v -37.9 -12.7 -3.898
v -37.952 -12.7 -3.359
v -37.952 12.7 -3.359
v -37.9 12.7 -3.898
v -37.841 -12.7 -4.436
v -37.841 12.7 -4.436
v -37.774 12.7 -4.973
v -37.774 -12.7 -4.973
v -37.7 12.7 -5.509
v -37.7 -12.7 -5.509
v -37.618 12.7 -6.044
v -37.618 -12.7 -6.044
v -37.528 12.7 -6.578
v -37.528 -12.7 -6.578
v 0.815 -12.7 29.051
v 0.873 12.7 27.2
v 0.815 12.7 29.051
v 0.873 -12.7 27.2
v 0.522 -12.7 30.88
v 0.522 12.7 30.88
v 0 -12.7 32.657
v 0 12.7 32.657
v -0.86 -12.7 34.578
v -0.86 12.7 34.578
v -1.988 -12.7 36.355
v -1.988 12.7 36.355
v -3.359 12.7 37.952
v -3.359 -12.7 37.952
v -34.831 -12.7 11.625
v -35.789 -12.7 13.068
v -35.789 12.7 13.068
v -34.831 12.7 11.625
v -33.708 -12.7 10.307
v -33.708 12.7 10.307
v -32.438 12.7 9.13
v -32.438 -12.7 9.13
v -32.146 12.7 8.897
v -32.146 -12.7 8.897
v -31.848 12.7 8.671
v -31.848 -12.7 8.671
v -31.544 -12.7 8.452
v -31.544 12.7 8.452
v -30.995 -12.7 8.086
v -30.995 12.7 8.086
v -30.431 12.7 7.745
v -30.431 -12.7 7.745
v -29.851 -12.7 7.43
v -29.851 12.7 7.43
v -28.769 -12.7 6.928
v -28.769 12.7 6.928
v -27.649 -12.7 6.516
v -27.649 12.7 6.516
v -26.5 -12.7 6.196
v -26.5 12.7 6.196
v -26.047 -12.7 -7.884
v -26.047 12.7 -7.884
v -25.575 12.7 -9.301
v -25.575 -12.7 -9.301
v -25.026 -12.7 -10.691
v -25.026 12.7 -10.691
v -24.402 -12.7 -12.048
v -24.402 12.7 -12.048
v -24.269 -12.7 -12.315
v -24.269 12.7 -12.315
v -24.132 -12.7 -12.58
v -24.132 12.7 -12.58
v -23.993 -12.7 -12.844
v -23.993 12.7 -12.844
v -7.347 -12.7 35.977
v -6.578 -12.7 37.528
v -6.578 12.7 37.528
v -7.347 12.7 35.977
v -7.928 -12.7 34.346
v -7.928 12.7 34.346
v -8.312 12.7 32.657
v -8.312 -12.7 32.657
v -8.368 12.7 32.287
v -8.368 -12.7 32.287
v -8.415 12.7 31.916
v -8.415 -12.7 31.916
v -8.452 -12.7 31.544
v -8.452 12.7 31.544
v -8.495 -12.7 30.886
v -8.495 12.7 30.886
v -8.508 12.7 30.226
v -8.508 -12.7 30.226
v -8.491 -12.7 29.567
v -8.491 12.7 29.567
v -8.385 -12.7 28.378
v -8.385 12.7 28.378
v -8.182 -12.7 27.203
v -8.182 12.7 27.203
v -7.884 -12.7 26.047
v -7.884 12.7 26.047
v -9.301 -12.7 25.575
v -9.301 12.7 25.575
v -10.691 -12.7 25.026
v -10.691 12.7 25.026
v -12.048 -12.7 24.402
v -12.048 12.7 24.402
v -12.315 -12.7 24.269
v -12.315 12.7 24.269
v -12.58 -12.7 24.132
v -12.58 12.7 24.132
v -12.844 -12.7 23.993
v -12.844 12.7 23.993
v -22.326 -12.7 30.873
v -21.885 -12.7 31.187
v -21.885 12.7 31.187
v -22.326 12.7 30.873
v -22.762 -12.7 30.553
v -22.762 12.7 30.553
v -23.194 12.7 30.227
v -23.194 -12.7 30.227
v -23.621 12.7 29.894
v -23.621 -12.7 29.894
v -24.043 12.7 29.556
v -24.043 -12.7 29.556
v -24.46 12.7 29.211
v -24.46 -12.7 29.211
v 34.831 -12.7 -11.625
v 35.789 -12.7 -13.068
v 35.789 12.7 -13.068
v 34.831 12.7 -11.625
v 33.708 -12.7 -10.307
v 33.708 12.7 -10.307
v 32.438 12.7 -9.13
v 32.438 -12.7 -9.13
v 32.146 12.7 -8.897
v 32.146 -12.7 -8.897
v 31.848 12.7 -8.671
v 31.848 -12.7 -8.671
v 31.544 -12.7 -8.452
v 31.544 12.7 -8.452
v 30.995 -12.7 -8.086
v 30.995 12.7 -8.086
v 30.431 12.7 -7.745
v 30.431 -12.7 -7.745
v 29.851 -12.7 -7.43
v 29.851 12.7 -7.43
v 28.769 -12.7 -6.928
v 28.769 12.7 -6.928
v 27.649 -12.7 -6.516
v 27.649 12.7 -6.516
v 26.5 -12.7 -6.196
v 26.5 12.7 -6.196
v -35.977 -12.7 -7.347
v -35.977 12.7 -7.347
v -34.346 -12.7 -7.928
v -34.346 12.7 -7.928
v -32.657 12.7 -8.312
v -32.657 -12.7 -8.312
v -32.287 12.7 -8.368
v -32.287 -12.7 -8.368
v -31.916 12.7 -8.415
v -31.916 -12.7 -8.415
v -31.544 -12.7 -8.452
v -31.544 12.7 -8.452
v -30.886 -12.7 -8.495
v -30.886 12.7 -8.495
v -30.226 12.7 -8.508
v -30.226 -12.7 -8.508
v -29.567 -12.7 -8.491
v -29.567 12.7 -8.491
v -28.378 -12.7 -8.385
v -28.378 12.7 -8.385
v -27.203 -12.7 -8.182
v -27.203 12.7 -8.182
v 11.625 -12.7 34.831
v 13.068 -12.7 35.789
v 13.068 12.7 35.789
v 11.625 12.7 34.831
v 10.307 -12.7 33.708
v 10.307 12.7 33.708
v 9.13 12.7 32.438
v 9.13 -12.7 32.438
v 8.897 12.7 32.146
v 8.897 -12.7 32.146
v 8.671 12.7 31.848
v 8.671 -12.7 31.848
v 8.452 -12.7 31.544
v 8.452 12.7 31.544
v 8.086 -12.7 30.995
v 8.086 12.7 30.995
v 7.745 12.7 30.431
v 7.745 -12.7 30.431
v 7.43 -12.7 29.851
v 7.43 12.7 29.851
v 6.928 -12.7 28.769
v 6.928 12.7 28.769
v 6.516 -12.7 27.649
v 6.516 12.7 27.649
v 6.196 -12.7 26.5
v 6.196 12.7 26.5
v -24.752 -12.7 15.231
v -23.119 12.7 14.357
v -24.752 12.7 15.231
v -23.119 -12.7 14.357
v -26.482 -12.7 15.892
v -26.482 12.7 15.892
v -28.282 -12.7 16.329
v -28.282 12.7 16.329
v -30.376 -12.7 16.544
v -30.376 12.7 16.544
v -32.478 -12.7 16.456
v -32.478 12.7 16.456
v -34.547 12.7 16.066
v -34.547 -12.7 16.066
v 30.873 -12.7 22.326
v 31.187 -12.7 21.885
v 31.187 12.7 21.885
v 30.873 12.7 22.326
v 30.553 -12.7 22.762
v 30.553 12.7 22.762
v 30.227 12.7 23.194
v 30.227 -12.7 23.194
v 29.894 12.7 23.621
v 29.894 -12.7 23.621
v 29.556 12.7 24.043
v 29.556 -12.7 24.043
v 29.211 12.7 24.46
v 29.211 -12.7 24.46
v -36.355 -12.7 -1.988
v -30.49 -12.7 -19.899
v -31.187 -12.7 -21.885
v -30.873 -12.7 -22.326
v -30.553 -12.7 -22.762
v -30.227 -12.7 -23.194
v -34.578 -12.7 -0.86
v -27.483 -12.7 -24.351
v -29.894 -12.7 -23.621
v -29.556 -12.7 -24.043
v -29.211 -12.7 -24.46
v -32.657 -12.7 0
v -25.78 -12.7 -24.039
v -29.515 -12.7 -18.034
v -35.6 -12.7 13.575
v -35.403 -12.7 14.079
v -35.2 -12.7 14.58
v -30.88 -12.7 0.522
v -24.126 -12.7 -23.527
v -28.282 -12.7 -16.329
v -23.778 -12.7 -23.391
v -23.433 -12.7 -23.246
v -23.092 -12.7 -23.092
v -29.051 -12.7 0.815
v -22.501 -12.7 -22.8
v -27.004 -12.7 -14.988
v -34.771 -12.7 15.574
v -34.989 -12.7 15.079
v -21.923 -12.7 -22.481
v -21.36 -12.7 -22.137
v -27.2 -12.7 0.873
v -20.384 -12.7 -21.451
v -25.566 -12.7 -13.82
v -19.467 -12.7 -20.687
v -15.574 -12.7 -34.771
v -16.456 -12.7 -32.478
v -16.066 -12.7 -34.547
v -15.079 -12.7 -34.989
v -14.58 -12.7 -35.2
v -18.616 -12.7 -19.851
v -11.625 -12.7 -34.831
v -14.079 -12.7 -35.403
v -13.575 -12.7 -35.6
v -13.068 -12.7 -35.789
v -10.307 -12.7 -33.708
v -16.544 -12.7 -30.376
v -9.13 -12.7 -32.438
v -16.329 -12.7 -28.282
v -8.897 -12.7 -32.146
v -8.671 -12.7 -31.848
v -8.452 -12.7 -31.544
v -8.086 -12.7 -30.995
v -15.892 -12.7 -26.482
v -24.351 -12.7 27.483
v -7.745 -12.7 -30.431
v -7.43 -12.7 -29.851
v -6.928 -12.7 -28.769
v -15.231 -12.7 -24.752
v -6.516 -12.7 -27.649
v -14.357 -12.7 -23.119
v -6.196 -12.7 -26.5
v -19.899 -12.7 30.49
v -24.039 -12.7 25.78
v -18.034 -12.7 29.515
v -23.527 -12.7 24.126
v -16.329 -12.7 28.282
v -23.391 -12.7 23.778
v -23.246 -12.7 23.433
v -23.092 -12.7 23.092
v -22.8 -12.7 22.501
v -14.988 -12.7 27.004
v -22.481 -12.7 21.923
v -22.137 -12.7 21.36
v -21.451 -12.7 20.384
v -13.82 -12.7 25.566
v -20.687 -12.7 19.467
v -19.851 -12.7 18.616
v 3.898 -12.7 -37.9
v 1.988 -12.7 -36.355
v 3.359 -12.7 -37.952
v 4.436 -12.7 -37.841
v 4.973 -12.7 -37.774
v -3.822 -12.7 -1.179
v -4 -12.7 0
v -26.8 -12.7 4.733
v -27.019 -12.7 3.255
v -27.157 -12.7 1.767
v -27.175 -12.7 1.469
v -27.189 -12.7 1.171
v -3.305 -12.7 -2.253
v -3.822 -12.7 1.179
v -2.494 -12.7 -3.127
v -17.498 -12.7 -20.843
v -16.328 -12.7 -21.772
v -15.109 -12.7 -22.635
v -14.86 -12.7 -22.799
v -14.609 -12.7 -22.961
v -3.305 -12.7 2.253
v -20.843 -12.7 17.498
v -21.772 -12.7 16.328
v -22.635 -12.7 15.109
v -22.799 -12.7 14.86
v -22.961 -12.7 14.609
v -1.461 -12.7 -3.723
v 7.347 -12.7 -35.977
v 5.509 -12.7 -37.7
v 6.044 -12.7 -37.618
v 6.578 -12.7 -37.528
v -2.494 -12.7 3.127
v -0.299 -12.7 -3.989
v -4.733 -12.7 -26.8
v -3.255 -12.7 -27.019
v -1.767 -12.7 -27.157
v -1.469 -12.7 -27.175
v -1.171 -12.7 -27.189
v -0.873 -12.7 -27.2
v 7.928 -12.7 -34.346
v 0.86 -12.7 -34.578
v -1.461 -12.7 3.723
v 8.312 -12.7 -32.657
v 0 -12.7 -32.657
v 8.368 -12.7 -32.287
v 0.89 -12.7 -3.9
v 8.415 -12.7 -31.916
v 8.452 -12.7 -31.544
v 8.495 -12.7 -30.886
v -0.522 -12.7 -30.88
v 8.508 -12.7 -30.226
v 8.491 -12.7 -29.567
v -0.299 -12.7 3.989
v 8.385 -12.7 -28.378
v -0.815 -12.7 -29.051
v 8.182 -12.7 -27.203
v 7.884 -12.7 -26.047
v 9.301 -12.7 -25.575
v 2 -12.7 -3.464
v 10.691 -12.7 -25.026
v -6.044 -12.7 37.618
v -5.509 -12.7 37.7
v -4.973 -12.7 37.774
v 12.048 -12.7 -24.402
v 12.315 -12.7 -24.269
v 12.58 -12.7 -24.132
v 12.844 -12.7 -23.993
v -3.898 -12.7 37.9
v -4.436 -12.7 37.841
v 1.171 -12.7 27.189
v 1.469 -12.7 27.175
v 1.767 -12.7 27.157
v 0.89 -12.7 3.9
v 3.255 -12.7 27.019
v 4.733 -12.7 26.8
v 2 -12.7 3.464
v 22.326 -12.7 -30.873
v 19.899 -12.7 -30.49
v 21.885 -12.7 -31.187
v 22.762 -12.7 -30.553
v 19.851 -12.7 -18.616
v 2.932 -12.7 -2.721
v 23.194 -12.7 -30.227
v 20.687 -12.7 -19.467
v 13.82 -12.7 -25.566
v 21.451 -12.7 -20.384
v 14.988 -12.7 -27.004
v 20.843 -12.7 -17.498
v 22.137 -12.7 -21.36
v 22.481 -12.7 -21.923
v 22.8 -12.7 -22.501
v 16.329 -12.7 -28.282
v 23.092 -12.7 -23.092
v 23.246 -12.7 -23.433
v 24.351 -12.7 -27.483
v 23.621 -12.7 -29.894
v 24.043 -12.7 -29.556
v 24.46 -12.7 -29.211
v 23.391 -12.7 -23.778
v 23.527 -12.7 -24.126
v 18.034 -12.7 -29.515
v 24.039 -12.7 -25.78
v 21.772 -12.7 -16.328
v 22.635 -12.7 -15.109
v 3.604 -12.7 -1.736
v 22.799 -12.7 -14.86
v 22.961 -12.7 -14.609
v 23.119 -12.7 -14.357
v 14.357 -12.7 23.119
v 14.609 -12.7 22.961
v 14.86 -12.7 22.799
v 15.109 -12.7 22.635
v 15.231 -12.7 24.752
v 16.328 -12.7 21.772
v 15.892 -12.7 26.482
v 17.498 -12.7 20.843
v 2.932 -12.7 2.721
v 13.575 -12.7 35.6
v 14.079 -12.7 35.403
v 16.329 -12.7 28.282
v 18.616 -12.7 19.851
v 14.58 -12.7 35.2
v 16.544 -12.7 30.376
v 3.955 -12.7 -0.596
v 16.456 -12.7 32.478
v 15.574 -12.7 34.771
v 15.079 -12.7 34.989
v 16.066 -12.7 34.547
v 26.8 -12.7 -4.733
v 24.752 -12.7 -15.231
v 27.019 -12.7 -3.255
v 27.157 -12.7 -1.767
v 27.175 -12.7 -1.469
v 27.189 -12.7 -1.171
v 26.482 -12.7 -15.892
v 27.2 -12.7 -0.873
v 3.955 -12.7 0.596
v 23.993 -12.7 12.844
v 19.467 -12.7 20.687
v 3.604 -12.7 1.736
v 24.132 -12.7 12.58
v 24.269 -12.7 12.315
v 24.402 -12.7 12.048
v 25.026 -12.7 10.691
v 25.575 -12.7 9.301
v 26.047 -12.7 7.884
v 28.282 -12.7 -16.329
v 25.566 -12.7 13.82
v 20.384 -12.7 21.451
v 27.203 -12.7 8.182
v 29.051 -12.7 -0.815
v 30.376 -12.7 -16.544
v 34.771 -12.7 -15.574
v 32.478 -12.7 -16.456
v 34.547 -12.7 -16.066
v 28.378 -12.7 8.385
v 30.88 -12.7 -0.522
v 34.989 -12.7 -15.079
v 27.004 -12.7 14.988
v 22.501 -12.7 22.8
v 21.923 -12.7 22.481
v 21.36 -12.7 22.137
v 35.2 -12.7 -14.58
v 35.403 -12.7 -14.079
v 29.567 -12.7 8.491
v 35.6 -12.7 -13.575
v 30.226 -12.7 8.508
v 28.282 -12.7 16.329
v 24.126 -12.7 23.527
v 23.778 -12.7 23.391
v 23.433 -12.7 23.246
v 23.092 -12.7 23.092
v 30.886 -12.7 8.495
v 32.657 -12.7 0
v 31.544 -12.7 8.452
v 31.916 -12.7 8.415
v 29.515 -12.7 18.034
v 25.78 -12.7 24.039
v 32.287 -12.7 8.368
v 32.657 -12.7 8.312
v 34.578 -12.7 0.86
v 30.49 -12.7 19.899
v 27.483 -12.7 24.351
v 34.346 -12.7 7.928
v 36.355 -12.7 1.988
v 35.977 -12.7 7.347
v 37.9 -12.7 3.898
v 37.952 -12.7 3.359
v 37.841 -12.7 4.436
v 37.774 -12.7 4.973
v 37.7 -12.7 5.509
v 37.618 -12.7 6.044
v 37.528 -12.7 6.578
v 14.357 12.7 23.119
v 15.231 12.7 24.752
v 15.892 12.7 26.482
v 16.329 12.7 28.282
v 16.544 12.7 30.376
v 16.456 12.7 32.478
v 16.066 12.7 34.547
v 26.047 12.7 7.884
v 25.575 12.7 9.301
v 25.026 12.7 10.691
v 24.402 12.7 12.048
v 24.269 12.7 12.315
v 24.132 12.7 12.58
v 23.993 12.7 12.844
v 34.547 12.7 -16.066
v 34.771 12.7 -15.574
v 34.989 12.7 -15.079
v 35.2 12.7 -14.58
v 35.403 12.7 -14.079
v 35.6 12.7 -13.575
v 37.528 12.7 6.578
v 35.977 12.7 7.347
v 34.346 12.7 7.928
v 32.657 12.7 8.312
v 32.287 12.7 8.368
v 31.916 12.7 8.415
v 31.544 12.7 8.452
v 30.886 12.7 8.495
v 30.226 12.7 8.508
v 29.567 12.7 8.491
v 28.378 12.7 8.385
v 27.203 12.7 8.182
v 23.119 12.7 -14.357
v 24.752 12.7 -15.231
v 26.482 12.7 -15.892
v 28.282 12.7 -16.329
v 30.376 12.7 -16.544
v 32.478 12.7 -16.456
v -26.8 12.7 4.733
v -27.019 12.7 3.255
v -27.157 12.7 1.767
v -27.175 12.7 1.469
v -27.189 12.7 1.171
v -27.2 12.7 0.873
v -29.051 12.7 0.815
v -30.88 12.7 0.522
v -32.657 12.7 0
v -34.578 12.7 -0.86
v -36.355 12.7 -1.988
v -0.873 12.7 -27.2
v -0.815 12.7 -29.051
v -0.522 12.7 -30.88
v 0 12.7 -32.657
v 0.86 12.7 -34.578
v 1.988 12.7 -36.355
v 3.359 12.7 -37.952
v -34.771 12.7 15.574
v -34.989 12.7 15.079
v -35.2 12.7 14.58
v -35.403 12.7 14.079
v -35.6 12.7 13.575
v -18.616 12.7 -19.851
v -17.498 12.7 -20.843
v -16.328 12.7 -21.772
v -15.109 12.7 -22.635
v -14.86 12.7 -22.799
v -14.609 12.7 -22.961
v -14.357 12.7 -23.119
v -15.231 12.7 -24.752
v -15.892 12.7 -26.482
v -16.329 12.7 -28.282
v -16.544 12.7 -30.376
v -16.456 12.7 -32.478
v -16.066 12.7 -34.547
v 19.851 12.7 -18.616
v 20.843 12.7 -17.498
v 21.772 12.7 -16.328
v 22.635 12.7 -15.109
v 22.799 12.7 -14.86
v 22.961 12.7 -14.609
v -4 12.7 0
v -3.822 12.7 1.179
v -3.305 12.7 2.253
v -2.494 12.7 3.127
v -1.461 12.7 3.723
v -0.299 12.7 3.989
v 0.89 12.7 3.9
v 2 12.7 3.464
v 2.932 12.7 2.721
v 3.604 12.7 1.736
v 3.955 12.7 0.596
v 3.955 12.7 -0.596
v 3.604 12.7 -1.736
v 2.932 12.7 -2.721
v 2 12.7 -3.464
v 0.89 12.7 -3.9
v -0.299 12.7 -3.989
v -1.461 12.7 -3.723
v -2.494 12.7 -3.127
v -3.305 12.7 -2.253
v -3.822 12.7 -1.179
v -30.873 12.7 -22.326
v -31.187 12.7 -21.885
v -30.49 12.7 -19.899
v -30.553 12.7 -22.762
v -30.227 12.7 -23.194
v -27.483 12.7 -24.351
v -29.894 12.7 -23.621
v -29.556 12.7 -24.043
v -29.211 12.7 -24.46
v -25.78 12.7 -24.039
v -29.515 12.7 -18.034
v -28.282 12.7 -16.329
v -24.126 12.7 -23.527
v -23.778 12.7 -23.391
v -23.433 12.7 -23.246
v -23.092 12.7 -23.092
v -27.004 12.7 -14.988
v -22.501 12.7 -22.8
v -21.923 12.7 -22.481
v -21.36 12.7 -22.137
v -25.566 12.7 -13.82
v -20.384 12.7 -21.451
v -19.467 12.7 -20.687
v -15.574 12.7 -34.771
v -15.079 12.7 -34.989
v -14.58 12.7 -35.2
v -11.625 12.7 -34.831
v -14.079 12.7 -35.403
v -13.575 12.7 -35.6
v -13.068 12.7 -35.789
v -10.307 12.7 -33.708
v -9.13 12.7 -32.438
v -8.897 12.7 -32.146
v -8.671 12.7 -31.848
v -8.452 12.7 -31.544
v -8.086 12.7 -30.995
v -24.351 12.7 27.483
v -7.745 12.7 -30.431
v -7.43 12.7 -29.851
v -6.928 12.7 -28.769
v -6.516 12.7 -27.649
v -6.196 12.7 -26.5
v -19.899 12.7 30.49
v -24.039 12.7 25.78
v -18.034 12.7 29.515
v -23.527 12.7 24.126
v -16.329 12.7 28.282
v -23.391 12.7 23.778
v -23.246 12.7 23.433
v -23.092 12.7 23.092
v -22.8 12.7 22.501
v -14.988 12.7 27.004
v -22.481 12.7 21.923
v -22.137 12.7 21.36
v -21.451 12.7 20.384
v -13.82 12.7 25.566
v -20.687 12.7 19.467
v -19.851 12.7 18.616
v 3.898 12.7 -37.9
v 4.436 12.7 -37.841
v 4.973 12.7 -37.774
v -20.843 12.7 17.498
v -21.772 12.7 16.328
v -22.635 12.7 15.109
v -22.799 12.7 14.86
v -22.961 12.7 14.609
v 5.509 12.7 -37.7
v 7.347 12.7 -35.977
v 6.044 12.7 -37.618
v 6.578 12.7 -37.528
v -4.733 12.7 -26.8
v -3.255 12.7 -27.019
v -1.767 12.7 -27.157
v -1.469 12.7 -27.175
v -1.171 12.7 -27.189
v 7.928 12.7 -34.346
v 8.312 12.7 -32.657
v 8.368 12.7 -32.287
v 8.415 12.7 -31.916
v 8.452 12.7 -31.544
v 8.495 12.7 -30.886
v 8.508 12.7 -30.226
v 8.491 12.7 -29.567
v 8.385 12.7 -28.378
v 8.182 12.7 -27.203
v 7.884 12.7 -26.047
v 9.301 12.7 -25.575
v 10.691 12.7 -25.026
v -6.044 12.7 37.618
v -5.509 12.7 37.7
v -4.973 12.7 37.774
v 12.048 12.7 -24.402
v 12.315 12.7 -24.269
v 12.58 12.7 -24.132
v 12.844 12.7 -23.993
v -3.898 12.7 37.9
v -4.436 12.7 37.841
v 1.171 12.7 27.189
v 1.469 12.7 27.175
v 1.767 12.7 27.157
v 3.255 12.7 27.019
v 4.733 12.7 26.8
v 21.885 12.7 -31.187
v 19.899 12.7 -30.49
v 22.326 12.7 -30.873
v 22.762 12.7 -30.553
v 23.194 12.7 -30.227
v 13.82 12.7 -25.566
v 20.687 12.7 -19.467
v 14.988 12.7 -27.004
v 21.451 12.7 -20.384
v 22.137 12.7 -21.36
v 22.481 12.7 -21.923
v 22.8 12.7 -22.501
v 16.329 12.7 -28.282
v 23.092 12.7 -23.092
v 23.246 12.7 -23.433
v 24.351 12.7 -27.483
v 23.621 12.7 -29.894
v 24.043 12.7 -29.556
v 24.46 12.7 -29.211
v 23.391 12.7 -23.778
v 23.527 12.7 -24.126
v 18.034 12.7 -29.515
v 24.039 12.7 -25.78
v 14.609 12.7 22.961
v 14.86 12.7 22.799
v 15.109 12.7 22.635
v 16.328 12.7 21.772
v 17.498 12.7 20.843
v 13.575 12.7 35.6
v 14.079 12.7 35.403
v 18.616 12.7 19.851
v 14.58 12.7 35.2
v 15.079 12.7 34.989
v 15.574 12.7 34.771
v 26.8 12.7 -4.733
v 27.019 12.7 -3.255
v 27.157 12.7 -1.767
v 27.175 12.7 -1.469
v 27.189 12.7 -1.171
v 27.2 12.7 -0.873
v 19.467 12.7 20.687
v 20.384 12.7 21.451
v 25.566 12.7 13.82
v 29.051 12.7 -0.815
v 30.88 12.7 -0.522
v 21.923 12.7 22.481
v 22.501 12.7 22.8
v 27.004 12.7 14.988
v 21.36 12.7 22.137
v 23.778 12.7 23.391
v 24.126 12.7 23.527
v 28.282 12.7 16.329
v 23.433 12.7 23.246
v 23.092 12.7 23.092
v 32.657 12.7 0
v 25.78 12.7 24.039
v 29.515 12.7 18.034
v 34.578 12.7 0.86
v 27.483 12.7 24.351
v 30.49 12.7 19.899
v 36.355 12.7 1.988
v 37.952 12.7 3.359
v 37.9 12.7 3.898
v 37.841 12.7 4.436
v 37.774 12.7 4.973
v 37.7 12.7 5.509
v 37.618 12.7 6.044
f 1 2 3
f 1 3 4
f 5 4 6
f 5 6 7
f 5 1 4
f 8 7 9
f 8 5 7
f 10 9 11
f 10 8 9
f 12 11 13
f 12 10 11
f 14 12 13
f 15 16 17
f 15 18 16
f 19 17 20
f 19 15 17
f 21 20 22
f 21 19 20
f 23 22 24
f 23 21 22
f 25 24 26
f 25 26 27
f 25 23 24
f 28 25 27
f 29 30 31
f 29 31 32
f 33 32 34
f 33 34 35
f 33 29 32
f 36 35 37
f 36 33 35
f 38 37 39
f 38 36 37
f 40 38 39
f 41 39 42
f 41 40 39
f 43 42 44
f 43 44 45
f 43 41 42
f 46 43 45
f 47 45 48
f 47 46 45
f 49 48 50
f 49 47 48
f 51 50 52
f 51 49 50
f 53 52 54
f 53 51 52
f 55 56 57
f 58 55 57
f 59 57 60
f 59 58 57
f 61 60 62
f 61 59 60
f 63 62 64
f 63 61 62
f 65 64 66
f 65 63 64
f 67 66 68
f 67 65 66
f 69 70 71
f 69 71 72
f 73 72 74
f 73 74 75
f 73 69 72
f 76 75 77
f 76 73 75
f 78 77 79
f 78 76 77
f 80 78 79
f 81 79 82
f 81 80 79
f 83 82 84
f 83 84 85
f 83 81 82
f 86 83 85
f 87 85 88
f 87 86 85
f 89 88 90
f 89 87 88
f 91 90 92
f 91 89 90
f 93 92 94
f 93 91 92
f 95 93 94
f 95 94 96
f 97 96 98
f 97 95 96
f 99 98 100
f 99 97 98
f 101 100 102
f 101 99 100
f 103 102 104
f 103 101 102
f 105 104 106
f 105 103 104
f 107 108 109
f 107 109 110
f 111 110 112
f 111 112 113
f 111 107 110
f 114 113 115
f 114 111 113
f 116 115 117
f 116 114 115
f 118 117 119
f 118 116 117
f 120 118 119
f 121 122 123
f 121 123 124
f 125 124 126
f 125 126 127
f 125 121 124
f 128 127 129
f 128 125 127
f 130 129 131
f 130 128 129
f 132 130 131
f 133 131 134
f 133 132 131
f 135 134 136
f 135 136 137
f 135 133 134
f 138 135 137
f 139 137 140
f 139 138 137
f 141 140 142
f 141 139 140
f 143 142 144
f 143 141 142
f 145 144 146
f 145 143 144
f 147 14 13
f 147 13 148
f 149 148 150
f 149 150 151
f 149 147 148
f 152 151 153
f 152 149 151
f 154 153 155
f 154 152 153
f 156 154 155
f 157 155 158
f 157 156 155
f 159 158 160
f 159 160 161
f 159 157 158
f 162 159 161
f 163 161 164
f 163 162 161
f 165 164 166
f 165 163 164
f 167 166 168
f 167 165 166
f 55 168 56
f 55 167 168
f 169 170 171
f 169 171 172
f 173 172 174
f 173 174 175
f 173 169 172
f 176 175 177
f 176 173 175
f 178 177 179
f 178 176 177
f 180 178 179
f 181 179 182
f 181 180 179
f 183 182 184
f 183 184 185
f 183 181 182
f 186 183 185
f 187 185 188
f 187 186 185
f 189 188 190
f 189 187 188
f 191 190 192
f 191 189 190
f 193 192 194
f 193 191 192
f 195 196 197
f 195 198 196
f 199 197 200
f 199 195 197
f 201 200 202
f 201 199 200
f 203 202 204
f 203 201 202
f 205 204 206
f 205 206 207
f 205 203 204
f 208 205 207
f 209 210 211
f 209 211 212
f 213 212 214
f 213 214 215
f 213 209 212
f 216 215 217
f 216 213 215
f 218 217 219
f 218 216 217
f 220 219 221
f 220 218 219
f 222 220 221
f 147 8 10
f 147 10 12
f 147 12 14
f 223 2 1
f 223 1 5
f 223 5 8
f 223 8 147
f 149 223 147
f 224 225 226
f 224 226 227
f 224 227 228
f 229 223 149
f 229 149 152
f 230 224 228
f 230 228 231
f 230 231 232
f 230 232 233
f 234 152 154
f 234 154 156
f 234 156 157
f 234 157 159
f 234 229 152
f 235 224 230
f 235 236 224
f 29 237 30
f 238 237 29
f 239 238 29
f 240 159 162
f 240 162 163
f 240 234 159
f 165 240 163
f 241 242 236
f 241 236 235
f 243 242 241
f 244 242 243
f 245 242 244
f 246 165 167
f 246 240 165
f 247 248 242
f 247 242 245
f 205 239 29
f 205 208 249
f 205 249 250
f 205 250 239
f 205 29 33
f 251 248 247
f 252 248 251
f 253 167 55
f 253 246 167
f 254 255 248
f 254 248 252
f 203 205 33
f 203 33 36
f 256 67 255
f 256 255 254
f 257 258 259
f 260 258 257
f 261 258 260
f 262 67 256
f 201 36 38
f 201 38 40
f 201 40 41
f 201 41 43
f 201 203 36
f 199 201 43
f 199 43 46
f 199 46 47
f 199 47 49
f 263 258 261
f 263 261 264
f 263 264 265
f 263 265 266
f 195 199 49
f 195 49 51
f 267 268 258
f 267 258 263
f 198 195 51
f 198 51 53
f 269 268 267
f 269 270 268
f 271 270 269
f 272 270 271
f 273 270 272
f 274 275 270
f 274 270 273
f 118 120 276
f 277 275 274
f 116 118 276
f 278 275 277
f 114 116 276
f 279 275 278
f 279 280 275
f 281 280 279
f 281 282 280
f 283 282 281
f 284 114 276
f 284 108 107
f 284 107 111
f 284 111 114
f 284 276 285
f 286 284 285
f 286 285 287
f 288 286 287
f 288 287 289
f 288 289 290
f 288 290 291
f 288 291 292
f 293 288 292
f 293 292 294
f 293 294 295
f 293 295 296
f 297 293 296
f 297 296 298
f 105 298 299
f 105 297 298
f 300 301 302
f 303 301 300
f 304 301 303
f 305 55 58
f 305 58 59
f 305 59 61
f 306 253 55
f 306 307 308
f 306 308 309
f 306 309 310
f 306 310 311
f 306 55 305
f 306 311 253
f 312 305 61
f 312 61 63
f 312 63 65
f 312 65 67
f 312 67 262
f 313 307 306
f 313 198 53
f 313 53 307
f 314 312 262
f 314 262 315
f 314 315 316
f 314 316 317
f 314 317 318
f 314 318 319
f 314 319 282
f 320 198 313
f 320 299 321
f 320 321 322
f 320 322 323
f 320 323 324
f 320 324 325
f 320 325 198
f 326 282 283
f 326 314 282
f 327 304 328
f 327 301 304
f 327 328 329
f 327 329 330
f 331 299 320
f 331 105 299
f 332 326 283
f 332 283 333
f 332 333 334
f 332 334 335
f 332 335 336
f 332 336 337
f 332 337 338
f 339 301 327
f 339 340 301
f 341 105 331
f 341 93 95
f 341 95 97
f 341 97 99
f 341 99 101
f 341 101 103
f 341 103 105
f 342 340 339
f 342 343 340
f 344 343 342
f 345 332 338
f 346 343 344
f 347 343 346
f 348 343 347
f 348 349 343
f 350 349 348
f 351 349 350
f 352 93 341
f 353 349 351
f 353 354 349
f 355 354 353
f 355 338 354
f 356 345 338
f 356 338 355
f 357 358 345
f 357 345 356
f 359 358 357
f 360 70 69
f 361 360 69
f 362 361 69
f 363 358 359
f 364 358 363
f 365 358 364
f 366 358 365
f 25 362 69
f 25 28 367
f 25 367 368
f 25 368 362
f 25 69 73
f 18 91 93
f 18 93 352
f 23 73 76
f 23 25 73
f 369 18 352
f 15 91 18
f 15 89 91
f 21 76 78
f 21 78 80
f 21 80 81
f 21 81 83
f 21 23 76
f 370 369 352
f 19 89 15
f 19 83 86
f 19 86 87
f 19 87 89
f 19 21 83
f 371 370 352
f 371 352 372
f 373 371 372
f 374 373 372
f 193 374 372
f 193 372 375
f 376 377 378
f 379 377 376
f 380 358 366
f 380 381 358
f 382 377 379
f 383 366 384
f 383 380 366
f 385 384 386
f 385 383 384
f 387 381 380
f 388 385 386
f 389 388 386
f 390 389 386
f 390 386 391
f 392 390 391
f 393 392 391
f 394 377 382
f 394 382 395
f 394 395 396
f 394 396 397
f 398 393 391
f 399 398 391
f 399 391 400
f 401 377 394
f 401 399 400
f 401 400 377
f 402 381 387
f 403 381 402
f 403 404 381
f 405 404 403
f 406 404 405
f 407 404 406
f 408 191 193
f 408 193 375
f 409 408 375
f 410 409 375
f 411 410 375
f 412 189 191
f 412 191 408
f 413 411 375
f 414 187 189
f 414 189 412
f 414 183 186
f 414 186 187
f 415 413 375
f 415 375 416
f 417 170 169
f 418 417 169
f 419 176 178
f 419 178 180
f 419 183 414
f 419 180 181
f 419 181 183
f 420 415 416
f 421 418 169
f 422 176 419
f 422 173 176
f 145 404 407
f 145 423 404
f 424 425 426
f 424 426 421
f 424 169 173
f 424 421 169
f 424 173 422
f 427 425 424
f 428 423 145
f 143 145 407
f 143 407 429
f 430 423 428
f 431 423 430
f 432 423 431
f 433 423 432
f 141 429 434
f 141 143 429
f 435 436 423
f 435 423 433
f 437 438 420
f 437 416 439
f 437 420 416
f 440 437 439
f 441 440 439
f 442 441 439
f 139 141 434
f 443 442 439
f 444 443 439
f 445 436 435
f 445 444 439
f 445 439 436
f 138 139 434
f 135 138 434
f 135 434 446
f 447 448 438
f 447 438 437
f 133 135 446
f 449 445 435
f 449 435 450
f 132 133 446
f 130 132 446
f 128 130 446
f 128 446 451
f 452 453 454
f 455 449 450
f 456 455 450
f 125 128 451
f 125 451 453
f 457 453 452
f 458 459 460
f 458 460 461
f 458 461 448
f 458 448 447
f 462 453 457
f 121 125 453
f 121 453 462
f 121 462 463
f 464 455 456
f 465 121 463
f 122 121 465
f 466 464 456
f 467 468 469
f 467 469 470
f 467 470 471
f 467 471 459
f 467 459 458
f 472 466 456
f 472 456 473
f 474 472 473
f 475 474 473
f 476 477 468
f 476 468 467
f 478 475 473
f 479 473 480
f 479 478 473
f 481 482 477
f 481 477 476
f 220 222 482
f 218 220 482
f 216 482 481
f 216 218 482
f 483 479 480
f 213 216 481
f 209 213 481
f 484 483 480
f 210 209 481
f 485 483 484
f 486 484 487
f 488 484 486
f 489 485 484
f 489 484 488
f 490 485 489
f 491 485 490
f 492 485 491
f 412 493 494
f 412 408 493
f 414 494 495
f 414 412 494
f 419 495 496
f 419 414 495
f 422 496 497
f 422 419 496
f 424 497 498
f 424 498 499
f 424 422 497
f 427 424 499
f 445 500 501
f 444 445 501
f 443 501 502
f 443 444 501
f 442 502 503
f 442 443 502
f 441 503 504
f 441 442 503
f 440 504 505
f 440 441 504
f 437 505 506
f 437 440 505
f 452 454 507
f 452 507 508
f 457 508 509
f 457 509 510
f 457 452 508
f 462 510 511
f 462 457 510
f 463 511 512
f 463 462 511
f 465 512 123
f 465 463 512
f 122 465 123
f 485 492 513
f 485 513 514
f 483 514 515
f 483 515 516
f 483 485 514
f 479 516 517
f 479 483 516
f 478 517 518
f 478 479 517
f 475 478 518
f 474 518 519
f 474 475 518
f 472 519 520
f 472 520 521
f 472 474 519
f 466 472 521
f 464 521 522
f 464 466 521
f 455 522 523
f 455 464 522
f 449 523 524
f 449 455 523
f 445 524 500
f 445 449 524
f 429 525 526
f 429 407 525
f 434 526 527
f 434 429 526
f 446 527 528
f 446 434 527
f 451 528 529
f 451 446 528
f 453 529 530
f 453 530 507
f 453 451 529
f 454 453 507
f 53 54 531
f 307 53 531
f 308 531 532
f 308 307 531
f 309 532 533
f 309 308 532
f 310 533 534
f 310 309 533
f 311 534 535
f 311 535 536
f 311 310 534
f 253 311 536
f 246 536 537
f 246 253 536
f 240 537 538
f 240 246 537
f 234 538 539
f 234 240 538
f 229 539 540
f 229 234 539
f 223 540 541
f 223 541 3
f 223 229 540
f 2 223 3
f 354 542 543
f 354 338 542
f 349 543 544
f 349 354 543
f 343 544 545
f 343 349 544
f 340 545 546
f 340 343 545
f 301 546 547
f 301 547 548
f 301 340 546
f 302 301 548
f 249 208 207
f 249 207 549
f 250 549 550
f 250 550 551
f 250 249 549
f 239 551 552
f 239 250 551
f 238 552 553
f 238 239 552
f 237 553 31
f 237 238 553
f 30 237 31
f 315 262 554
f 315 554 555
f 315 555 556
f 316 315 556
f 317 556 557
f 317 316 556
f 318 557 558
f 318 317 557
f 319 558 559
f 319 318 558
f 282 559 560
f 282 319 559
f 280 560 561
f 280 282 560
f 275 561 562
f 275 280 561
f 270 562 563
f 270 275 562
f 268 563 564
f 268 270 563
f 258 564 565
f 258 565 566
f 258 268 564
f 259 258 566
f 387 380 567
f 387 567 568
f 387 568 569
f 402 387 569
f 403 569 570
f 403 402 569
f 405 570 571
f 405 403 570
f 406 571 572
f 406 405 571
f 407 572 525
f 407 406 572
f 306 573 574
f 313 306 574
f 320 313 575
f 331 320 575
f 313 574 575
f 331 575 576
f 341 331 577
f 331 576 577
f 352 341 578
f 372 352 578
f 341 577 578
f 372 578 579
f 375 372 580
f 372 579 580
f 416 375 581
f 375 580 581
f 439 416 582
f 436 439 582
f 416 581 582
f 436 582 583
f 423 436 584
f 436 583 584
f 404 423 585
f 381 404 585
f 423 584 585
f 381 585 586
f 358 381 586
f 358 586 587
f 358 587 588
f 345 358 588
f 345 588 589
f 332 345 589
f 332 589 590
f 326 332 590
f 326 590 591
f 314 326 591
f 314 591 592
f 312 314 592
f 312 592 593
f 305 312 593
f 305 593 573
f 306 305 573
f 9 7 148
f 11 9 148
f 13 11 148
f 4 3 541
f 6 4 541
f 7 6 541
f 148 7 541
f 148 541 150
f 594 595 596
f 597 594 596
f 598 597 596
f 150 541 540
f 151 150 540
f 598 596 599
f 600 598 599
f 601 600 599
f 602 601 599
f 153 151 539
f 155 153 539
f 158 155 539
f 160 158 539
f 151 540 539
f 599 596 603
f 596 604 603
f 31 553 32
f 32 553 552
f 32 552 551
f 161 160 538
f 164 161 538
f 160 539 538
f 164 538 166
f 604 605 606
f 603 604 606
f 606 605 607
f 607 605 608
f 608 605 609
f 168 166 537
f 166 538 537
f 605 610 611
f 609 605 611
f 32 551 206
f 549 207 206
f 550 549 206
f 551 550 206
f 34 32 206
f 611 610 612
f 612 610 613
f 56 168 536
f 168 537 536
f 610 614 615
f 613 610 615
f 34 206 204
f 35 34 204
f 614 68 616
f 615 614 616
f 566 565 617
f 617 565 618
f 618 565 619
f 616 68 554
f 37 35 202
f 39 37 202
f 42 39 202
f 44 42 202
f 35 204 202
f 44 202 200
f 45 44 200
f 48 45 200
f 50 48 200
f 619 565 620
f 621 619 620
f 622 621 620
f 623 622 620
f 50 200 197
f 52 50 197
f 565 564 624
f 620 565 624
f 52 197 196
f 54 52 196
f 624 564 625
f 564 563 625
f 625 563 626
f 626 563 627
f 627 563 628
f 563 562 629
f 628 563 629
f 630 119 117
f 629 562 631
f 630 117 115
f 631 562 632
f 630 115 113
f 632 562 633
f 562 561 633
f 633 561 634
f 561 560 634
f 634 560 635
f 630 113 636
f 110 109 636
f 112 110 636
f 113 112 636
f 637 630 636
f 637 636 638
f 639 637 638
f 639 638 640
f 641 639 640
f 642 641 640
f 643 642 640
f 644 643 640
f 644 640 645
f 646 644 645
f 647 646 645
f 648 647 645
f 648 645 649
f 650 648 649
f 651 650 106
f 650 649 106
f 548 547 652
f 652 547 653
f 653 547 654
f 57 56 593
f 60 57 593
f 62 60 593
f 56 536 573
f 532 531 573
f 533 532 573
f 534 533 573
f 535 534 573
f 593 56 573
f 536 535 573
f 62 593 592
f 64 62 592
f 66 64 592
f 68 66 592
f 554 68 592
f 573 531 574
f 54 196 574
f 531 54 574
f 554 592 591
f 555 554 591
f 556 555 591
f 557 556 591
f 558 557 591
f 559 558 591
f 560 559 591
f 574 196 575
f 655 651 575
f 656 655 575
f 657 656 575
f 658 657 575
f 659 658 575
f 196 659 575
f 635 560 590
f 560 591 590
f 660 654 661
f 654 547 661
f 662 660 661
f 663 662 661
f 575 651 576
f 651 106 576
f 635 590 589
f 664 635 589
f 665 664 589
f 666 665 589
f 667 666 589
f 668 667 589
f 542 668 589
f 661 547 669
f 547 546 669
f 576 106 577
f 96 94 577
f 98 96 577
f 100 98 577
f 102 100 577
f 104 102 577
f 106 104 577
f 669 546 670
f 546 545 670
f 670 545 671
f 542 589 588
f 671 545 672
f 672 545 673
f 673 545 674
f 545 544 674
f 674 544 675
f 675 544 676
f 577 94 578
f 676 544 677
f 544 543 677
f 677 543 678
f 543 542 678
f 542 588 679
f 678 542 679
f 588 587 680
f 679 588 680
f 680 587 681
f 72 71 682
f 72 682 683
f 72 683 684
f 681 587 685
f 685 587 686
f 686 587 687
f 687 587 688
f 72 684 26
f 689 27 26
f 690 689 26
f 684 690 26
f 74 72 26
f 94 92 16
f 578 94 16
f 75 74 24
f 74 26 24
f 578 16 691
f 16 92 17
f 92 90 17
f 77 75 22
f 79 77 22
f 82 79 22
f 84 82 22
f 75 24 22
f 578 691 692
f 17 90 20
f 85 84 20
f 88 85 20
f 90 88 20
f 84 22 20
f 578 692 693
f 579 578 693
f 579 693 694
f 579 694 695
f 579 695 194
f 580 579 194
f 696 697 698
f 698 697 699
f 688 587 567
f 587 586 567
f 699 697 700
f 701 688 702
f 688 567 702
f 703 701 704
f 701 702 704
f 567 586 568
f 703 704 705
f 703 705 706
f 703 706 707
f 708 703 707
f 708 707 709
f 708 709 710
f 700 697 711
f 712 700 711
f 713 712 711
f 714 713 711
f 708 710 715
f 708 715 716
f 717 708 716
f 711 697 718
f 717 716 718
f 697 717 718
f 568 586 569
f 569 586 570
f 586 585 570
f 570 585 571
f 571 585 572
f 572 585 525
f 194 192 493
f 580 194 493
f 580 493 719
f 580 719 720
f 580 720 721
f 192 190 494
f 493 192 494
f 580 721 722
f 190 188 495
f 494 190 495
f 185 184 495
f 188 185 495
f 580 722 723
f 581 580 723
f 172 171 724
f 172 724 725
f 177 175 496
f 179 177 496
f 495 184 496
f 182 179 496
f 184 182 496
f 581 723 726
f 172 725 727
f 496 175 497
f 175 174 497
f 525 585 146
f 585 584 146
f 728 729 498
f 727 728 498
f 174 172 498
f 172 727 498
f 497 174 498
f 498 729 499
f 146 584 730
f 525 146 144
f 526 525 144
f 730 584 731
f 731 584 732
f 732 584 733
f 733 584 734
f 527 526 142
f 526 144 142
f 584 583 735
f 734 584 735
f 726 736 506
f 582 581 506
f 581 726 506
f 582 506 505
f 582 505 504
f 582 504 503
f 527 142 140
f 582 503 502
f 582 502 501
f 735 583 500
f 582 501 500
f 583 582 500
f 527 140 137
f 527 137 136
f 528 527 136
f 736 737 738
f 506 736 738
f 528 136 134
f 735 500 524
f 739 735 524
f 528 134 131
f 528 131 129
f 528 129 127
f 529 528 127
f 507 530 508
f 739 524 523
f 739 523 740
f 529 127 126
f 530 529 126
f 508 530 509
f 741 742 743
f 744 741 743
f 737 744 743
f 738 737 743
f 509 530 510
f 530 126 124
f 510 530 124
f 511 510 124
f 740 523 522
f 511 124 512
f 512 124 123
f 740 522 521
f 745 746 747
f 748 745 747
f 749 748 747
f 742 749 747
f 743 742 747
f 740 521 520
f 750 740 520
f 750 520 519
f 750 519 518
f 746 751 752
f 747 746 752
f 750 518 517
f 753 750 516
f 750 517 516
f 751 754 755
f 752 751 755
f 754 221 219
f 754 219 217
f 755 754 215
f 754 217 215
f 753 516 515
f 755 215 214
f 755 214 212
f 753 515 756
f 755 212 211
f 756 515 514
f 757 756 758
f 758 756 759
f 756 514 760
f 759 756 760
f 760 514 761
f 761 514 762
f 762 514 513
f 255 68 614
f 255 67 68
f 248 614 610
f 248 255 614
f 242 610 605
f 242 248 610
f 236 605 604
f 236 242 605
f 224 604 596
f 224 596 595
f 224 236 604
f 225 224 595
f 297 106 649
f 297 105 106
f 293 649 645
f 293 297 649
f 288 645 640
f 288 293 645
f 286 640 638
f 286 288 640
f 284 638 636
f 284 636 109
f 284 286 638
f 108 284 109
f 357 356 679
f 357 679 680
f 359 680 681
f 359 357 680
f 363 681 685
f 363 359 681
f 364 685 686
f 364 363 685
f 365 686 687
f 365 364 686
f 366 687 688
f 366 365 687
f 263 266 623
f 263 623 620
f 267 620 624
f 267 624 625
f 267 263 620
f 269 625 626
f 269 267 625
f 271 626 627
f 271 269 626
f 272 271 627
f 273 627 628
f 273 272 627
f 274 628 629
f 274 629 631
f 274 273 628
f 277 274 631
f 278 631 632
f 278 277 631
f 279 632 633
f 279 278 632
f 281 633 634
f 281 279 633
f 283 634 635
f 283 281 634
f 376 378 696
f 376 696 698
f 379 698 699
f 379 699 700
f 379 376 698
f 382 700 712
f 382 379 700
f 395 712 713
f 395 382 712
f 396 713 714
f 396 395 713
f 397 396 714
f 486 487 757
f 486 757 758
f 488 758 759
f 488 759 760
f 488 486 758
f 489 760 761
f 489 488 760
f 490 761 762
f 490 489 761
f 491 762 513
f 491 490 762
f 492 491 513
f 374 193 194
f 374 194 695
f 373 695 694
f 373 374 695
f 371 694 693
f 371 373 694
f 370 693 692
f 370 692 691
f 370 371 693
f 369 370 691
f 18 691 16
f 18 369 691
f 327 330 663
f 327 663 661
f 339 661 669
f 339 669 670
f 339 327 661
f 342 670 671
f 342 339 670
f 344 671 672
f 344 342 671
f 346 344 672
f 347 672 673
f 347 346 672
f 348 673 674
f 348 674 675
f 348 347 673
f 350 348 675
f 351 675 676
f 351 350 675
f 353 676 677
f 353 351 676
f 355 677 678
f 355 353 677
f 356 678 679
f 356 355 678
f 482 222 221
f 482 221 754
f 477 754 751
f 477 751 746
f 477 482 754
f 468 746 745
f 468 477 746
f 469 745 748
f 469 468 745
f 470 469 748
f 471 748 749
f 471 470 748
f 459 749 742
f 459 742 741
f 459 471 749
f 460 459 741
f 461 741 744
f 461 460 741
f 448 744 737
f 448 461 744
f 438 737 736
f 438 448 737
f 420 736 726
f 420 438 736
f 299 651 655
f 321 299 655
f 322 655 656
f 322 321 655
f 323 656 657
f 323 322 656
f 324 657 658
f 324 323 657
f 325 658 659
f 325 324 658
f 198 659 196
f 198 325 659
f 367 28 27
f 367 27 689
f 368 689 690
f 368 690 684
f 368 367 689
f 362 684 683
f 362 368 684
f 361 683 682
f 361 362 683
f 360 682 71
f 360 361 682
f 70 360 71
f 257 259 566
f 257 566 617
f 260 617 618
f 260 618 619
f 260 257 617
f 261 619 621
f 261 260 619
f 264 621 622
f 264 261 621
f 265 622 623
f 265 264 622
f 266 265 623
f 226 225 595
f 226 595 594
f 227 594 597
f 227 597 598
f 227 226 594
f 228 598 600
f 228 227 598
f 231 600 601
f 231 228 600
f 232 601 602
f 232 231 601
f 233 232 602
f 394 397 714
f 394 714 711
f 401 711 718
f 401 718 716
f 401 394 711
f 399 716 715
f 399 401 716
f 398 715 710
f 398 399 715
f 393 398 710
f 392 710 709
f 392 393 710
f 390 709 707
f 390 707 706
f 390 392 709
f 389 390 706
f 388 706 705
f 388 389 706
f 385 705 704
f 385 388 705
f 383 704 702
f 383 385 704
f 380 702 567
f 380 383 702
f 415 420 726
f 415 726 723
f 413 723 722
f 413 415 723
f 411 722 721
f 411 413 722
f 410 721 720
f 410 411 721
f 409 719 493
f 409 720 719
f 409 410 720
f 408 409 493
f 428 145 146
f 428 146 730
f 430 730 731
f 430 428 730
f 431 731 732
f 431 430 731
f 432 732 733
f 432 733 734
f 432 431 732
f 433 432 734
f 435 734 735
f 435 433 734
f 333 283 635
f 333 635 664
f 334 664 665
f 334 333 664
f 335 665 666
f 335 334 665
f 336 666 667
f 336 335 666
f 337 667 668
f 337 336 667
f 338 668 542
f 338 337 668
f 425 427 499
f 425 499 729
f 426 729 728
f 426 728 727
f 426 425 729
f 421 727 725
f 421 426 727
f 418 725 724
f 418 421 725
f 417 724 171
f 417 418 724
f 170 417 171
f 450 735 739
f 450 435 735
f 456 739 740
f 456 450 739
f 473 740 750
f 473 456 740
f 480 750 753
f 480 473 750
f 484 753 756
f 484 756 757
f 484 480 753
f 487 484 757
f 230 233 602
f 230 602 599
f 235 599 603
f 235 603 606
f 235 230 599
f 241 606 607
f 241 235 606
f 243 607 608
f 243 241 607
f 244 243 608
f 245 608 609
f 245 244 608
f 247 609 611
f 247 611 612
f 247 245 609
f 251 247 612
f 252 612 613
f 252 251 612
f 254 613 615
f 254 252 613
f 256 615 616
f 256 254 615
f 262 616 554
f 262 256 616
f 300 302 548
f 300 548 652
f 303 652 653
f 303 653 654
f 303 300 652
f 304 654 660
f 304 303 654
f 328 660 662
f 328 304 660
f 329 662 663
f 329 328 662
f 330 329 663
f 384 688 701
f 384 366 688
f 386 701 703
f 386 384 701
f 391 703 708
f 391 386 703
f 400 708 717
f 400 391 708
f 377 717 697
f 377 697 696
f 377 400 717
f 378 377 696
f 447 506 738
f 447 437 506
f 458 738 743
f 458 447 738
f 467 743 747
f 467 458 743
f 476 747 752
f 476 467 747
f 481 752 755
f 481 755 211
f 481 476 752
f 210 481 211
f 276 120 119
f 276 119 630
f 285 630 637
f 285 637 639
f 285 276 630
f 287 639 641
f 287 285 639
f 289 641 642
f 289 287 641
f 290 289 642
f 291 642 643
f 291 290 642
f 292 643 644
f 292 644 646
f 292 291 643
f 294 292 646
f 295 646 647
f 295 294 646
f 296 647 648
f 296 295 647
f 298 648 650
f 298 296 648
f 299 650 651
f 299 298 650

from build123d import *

# Parameters (mm, degrees)
F2_DEPTH = 12.7
F3_COUNT = 12
F3_ANGLE = 330
F5_D     = 8


with BuildPart() as f2:
    # F1 (on Front) → F2 (new body, symmetric)
    with BuildSketch(Plane.XZ):
        with BuildLine():
            Line((0, 27.2142857143), (0, 32.6571428571))
            Line((0, 32.6571428571), (-4.1027982168, 31.163846429))
            Line((-4.1027982168, 31.163846429), (-3.5521770883, 26.9814637274))
            ThreePointArc((-3.5521770883, 26.9814637274), (-1.7798994455, 27.1560178396), (0, 27.2142857143))
        make_face()
        with BuildLine():
            Line((-3.5521770883, 26.9814637274), (-4.1027982168, 31.163846429))
            Line((-4.1027982168, 31.163846429), (-8.4908538679, 29.5667247857))
            ThreePointArc((-8.4908538679, 29.5667247857), (-8.2952422965, 27.7884140488), (-7.8836733992, 26.0473614916))
            ThreePointArc((-7.8836733992, 26.0473614916), (-5.7369683492, 26.6027167992), (-3.5521770883, 26.9814637274))
        make_face()
        with BuildLine():
            Line((-4.1027982168, 31.163846429), (-4.2626125059, 32.3777564729))
            ThreePointArc((-4.2626125059, 32.3777564729), (-6.3710925161, 32.0296450143), (-8.4522905301, 31.5443776985))
            ThreePointArc((-8.4522905301, 31.5443776985), (-8.5050911091, 30.5562048457), (-8.4908538679, 29.5667247857))
            Line((-8.4908538679, 29.5667247857), (-4.1027982168, 31.163846429))
        make_face()
        with BuildLine():
            ThreePointArc((-8.4522905301, 31.5443776985), (-6.3710925161, 32.0296450143), (-4.2626125059, 32.3777564729))
            Line((-4.2626125059, 32.3777564729), (-4.2993944212, 32.6571428571))
            Line((-4.2993944212, 32.6571428571), (-8.3117038653, 32.6571428571))
            ThreePointArc((-8.3117038653, 32.6571428571), (-8.3926831774, 32.1021103437), (-8.4522905301, 31.5443776985))
        make_face()
        with BuildLine():
            Line((-4.1027982168, 31.163846429), (0, 32.6571428571))
            ThreePointArc((0, 32.6571428571), (-2.1358793346, 32.5872214075), (-4.2626125059, 32.3777564729))
            Line((-4.2626125059, 32.3777564729), (-4.1027982168, 31.163846429))
        make_face()
        with BuildLine():
            ThreePointArc((-4.2626125059, 32.3777564729), (-2.1358793346, 32.5872214075), (0, 32.6571428571))
            Line((0, 32.6571428571), (-4.2993944212, 32.6571428571))
            Line((-4.2993944212, 32.6571428571), (-4.2626125059, 32.3777564729))
        make_face()
        with BuildLine():
            ThreePointArc((0, 32.6571428571), (-1.3922286837, 35.486786515), (-3.3594239194, 37.9516043262))
            ThreePointArc((-3.3594239194, 37.9516043262), (-4.1671816864, 37.8714219009), (-4.9730479236, 37.7740492183))
            Line((-4.9730479236, 37.7740492183), (-4.2993944212, 32.6571428571))
            Line((-4.2993944212, 32.6571428571), (0, 32.6571428571))
        make_face()
        with BuildLine():
            Line((-4.2993944212, 32.6571428571), (-4.9730479236, 37.7740492183))
            ThreePointArc((-4.9730479236, 37.7740492183), (-5.7766568393, 37.6595304772), (-6.5776436666, 37.5279176587))
            ThreePointArc((-6.5776436666, 37.5279176587), (-7.661923736, 35.1698741183), (-8.3117038653, 32.6571428571))
            Line((-8.3117038653, 32.6571428571), (-4.2993944212, 32.6571428571))
        make_face()
        with BuildLine():
            ThreePointArc((0.8734905136, 27.2002639925), (0.6971989167, 29.9703946199), (0, 32.6571428571))
            Line((0, 32.6571428571), (0, 27.2142857143))
            ThreePointArc((0, 27.2142857143), (0.4368015242, 27.210780058), (0.8734905136, 27.2002639925))
        make_face()
        with BuildLine():
            ThreePointArc((27.2142857143, 0), (23.1138516304, 14.3654867564), (12.0481915595, 24.4020168651))
            ThreePointArc((12.0481915595, 24.4020168651), (6.8095488061, 19.7367686343), (0, 18.0521428571))
            Line((0, 18.0521428571), (0, 0))
            Line((0, 0), (-2.402809942, 18.2511534992))
            ThreePointArc((-2.402809942, 18.2511534992), (-7.8527791982, 20.3429281496), (-12.0481915595, 24.4020168651))
            ThreePointArc((-12.0481915595, 24.4020168651), (-14.3654867564, -23.1138516304), (27.2142857143, 0))
        make_face()
        with BuildLine():
            ThreePointArc((-7.8836733992, 26.0473614916), (-9.9998299945, 25.3104868981), (-12.0481915595, 24.4020168651))
            ThreePointArc((-12.0481915595, 24.4020168651), (-7.8527791982, 20.3429281496), (-2.402809942, 18.2511534992))
            Line((-2.402809942, 18.2511534992), (-3.5521770883, 26.9814637274))
            ThreePointArc((-3.5521770883, 26.9814637274), (-5.7369683492, 26.6027167992), (-7.8836733992, 26.0473614916))
        make_face()
        with BuildLine():
            Line((0, 18.0521428571), (0, 27.2142857143))
            ThreePointArc((0, 27.2142857143), (-1.7798994455, 27.1560178396), (-3.5521770883, 26.9814637274))
            Line((-3.5521770883, 26.9814637274), (-2.402809942, 18.2511534992))
            ThreePointArc((-2.402809942, 18.2511534992), (-1.2055186491, 18.10198055), (0, 18.0521428571))
        make_face()
        with BuildLine():
            Line((0, 0), (0, 18.0521428571))
            ThreePointArc((0, 18.0521428571), (-1.2055186491, 18.10198055), (-2.402809942, 18.2511534992))
            Line((-2.402809942, 18.2511534992), (0, 0))
        make_face()
        with BuildLine():
            ThreePointArc((0.8734905136, 27.2002639925), (0.4368015242, 27.210780058), (0, 27.2142857143))
            Line((0, 27.2142857143), (0, 18.0521428571))
            ThreePointArc((0, 18.0521428571), (6.8095488061, 19.7367686343), (12.0481915595, 24.4020168651))
            ThreePointArc((12.0481915595, 24.4020168651), (6.6105985846, 26.399191906), (0.8734905136, 27.2002639925))
        make_face()
    extrude(amount=F2_DEPTH, both=True)

    # F3: F2 ×12 about axis
    f3_axis = Axis((0, 0, 0), (0, -1, 0))


with BuildPart() as f2_1:
    add(f2.part)
    for i in range(1, F3_COUNT):
        add(f2.part.rotate(f3_axis, i * F3_ANGLE / (F3_COUNT - 1)))

    # F5 (through all)
    with Locations(Plane.XZ.offset(12.7)):
        with Locations((0, 0)):
            Hole(F5_D / 2)


solid = f2_1.part
